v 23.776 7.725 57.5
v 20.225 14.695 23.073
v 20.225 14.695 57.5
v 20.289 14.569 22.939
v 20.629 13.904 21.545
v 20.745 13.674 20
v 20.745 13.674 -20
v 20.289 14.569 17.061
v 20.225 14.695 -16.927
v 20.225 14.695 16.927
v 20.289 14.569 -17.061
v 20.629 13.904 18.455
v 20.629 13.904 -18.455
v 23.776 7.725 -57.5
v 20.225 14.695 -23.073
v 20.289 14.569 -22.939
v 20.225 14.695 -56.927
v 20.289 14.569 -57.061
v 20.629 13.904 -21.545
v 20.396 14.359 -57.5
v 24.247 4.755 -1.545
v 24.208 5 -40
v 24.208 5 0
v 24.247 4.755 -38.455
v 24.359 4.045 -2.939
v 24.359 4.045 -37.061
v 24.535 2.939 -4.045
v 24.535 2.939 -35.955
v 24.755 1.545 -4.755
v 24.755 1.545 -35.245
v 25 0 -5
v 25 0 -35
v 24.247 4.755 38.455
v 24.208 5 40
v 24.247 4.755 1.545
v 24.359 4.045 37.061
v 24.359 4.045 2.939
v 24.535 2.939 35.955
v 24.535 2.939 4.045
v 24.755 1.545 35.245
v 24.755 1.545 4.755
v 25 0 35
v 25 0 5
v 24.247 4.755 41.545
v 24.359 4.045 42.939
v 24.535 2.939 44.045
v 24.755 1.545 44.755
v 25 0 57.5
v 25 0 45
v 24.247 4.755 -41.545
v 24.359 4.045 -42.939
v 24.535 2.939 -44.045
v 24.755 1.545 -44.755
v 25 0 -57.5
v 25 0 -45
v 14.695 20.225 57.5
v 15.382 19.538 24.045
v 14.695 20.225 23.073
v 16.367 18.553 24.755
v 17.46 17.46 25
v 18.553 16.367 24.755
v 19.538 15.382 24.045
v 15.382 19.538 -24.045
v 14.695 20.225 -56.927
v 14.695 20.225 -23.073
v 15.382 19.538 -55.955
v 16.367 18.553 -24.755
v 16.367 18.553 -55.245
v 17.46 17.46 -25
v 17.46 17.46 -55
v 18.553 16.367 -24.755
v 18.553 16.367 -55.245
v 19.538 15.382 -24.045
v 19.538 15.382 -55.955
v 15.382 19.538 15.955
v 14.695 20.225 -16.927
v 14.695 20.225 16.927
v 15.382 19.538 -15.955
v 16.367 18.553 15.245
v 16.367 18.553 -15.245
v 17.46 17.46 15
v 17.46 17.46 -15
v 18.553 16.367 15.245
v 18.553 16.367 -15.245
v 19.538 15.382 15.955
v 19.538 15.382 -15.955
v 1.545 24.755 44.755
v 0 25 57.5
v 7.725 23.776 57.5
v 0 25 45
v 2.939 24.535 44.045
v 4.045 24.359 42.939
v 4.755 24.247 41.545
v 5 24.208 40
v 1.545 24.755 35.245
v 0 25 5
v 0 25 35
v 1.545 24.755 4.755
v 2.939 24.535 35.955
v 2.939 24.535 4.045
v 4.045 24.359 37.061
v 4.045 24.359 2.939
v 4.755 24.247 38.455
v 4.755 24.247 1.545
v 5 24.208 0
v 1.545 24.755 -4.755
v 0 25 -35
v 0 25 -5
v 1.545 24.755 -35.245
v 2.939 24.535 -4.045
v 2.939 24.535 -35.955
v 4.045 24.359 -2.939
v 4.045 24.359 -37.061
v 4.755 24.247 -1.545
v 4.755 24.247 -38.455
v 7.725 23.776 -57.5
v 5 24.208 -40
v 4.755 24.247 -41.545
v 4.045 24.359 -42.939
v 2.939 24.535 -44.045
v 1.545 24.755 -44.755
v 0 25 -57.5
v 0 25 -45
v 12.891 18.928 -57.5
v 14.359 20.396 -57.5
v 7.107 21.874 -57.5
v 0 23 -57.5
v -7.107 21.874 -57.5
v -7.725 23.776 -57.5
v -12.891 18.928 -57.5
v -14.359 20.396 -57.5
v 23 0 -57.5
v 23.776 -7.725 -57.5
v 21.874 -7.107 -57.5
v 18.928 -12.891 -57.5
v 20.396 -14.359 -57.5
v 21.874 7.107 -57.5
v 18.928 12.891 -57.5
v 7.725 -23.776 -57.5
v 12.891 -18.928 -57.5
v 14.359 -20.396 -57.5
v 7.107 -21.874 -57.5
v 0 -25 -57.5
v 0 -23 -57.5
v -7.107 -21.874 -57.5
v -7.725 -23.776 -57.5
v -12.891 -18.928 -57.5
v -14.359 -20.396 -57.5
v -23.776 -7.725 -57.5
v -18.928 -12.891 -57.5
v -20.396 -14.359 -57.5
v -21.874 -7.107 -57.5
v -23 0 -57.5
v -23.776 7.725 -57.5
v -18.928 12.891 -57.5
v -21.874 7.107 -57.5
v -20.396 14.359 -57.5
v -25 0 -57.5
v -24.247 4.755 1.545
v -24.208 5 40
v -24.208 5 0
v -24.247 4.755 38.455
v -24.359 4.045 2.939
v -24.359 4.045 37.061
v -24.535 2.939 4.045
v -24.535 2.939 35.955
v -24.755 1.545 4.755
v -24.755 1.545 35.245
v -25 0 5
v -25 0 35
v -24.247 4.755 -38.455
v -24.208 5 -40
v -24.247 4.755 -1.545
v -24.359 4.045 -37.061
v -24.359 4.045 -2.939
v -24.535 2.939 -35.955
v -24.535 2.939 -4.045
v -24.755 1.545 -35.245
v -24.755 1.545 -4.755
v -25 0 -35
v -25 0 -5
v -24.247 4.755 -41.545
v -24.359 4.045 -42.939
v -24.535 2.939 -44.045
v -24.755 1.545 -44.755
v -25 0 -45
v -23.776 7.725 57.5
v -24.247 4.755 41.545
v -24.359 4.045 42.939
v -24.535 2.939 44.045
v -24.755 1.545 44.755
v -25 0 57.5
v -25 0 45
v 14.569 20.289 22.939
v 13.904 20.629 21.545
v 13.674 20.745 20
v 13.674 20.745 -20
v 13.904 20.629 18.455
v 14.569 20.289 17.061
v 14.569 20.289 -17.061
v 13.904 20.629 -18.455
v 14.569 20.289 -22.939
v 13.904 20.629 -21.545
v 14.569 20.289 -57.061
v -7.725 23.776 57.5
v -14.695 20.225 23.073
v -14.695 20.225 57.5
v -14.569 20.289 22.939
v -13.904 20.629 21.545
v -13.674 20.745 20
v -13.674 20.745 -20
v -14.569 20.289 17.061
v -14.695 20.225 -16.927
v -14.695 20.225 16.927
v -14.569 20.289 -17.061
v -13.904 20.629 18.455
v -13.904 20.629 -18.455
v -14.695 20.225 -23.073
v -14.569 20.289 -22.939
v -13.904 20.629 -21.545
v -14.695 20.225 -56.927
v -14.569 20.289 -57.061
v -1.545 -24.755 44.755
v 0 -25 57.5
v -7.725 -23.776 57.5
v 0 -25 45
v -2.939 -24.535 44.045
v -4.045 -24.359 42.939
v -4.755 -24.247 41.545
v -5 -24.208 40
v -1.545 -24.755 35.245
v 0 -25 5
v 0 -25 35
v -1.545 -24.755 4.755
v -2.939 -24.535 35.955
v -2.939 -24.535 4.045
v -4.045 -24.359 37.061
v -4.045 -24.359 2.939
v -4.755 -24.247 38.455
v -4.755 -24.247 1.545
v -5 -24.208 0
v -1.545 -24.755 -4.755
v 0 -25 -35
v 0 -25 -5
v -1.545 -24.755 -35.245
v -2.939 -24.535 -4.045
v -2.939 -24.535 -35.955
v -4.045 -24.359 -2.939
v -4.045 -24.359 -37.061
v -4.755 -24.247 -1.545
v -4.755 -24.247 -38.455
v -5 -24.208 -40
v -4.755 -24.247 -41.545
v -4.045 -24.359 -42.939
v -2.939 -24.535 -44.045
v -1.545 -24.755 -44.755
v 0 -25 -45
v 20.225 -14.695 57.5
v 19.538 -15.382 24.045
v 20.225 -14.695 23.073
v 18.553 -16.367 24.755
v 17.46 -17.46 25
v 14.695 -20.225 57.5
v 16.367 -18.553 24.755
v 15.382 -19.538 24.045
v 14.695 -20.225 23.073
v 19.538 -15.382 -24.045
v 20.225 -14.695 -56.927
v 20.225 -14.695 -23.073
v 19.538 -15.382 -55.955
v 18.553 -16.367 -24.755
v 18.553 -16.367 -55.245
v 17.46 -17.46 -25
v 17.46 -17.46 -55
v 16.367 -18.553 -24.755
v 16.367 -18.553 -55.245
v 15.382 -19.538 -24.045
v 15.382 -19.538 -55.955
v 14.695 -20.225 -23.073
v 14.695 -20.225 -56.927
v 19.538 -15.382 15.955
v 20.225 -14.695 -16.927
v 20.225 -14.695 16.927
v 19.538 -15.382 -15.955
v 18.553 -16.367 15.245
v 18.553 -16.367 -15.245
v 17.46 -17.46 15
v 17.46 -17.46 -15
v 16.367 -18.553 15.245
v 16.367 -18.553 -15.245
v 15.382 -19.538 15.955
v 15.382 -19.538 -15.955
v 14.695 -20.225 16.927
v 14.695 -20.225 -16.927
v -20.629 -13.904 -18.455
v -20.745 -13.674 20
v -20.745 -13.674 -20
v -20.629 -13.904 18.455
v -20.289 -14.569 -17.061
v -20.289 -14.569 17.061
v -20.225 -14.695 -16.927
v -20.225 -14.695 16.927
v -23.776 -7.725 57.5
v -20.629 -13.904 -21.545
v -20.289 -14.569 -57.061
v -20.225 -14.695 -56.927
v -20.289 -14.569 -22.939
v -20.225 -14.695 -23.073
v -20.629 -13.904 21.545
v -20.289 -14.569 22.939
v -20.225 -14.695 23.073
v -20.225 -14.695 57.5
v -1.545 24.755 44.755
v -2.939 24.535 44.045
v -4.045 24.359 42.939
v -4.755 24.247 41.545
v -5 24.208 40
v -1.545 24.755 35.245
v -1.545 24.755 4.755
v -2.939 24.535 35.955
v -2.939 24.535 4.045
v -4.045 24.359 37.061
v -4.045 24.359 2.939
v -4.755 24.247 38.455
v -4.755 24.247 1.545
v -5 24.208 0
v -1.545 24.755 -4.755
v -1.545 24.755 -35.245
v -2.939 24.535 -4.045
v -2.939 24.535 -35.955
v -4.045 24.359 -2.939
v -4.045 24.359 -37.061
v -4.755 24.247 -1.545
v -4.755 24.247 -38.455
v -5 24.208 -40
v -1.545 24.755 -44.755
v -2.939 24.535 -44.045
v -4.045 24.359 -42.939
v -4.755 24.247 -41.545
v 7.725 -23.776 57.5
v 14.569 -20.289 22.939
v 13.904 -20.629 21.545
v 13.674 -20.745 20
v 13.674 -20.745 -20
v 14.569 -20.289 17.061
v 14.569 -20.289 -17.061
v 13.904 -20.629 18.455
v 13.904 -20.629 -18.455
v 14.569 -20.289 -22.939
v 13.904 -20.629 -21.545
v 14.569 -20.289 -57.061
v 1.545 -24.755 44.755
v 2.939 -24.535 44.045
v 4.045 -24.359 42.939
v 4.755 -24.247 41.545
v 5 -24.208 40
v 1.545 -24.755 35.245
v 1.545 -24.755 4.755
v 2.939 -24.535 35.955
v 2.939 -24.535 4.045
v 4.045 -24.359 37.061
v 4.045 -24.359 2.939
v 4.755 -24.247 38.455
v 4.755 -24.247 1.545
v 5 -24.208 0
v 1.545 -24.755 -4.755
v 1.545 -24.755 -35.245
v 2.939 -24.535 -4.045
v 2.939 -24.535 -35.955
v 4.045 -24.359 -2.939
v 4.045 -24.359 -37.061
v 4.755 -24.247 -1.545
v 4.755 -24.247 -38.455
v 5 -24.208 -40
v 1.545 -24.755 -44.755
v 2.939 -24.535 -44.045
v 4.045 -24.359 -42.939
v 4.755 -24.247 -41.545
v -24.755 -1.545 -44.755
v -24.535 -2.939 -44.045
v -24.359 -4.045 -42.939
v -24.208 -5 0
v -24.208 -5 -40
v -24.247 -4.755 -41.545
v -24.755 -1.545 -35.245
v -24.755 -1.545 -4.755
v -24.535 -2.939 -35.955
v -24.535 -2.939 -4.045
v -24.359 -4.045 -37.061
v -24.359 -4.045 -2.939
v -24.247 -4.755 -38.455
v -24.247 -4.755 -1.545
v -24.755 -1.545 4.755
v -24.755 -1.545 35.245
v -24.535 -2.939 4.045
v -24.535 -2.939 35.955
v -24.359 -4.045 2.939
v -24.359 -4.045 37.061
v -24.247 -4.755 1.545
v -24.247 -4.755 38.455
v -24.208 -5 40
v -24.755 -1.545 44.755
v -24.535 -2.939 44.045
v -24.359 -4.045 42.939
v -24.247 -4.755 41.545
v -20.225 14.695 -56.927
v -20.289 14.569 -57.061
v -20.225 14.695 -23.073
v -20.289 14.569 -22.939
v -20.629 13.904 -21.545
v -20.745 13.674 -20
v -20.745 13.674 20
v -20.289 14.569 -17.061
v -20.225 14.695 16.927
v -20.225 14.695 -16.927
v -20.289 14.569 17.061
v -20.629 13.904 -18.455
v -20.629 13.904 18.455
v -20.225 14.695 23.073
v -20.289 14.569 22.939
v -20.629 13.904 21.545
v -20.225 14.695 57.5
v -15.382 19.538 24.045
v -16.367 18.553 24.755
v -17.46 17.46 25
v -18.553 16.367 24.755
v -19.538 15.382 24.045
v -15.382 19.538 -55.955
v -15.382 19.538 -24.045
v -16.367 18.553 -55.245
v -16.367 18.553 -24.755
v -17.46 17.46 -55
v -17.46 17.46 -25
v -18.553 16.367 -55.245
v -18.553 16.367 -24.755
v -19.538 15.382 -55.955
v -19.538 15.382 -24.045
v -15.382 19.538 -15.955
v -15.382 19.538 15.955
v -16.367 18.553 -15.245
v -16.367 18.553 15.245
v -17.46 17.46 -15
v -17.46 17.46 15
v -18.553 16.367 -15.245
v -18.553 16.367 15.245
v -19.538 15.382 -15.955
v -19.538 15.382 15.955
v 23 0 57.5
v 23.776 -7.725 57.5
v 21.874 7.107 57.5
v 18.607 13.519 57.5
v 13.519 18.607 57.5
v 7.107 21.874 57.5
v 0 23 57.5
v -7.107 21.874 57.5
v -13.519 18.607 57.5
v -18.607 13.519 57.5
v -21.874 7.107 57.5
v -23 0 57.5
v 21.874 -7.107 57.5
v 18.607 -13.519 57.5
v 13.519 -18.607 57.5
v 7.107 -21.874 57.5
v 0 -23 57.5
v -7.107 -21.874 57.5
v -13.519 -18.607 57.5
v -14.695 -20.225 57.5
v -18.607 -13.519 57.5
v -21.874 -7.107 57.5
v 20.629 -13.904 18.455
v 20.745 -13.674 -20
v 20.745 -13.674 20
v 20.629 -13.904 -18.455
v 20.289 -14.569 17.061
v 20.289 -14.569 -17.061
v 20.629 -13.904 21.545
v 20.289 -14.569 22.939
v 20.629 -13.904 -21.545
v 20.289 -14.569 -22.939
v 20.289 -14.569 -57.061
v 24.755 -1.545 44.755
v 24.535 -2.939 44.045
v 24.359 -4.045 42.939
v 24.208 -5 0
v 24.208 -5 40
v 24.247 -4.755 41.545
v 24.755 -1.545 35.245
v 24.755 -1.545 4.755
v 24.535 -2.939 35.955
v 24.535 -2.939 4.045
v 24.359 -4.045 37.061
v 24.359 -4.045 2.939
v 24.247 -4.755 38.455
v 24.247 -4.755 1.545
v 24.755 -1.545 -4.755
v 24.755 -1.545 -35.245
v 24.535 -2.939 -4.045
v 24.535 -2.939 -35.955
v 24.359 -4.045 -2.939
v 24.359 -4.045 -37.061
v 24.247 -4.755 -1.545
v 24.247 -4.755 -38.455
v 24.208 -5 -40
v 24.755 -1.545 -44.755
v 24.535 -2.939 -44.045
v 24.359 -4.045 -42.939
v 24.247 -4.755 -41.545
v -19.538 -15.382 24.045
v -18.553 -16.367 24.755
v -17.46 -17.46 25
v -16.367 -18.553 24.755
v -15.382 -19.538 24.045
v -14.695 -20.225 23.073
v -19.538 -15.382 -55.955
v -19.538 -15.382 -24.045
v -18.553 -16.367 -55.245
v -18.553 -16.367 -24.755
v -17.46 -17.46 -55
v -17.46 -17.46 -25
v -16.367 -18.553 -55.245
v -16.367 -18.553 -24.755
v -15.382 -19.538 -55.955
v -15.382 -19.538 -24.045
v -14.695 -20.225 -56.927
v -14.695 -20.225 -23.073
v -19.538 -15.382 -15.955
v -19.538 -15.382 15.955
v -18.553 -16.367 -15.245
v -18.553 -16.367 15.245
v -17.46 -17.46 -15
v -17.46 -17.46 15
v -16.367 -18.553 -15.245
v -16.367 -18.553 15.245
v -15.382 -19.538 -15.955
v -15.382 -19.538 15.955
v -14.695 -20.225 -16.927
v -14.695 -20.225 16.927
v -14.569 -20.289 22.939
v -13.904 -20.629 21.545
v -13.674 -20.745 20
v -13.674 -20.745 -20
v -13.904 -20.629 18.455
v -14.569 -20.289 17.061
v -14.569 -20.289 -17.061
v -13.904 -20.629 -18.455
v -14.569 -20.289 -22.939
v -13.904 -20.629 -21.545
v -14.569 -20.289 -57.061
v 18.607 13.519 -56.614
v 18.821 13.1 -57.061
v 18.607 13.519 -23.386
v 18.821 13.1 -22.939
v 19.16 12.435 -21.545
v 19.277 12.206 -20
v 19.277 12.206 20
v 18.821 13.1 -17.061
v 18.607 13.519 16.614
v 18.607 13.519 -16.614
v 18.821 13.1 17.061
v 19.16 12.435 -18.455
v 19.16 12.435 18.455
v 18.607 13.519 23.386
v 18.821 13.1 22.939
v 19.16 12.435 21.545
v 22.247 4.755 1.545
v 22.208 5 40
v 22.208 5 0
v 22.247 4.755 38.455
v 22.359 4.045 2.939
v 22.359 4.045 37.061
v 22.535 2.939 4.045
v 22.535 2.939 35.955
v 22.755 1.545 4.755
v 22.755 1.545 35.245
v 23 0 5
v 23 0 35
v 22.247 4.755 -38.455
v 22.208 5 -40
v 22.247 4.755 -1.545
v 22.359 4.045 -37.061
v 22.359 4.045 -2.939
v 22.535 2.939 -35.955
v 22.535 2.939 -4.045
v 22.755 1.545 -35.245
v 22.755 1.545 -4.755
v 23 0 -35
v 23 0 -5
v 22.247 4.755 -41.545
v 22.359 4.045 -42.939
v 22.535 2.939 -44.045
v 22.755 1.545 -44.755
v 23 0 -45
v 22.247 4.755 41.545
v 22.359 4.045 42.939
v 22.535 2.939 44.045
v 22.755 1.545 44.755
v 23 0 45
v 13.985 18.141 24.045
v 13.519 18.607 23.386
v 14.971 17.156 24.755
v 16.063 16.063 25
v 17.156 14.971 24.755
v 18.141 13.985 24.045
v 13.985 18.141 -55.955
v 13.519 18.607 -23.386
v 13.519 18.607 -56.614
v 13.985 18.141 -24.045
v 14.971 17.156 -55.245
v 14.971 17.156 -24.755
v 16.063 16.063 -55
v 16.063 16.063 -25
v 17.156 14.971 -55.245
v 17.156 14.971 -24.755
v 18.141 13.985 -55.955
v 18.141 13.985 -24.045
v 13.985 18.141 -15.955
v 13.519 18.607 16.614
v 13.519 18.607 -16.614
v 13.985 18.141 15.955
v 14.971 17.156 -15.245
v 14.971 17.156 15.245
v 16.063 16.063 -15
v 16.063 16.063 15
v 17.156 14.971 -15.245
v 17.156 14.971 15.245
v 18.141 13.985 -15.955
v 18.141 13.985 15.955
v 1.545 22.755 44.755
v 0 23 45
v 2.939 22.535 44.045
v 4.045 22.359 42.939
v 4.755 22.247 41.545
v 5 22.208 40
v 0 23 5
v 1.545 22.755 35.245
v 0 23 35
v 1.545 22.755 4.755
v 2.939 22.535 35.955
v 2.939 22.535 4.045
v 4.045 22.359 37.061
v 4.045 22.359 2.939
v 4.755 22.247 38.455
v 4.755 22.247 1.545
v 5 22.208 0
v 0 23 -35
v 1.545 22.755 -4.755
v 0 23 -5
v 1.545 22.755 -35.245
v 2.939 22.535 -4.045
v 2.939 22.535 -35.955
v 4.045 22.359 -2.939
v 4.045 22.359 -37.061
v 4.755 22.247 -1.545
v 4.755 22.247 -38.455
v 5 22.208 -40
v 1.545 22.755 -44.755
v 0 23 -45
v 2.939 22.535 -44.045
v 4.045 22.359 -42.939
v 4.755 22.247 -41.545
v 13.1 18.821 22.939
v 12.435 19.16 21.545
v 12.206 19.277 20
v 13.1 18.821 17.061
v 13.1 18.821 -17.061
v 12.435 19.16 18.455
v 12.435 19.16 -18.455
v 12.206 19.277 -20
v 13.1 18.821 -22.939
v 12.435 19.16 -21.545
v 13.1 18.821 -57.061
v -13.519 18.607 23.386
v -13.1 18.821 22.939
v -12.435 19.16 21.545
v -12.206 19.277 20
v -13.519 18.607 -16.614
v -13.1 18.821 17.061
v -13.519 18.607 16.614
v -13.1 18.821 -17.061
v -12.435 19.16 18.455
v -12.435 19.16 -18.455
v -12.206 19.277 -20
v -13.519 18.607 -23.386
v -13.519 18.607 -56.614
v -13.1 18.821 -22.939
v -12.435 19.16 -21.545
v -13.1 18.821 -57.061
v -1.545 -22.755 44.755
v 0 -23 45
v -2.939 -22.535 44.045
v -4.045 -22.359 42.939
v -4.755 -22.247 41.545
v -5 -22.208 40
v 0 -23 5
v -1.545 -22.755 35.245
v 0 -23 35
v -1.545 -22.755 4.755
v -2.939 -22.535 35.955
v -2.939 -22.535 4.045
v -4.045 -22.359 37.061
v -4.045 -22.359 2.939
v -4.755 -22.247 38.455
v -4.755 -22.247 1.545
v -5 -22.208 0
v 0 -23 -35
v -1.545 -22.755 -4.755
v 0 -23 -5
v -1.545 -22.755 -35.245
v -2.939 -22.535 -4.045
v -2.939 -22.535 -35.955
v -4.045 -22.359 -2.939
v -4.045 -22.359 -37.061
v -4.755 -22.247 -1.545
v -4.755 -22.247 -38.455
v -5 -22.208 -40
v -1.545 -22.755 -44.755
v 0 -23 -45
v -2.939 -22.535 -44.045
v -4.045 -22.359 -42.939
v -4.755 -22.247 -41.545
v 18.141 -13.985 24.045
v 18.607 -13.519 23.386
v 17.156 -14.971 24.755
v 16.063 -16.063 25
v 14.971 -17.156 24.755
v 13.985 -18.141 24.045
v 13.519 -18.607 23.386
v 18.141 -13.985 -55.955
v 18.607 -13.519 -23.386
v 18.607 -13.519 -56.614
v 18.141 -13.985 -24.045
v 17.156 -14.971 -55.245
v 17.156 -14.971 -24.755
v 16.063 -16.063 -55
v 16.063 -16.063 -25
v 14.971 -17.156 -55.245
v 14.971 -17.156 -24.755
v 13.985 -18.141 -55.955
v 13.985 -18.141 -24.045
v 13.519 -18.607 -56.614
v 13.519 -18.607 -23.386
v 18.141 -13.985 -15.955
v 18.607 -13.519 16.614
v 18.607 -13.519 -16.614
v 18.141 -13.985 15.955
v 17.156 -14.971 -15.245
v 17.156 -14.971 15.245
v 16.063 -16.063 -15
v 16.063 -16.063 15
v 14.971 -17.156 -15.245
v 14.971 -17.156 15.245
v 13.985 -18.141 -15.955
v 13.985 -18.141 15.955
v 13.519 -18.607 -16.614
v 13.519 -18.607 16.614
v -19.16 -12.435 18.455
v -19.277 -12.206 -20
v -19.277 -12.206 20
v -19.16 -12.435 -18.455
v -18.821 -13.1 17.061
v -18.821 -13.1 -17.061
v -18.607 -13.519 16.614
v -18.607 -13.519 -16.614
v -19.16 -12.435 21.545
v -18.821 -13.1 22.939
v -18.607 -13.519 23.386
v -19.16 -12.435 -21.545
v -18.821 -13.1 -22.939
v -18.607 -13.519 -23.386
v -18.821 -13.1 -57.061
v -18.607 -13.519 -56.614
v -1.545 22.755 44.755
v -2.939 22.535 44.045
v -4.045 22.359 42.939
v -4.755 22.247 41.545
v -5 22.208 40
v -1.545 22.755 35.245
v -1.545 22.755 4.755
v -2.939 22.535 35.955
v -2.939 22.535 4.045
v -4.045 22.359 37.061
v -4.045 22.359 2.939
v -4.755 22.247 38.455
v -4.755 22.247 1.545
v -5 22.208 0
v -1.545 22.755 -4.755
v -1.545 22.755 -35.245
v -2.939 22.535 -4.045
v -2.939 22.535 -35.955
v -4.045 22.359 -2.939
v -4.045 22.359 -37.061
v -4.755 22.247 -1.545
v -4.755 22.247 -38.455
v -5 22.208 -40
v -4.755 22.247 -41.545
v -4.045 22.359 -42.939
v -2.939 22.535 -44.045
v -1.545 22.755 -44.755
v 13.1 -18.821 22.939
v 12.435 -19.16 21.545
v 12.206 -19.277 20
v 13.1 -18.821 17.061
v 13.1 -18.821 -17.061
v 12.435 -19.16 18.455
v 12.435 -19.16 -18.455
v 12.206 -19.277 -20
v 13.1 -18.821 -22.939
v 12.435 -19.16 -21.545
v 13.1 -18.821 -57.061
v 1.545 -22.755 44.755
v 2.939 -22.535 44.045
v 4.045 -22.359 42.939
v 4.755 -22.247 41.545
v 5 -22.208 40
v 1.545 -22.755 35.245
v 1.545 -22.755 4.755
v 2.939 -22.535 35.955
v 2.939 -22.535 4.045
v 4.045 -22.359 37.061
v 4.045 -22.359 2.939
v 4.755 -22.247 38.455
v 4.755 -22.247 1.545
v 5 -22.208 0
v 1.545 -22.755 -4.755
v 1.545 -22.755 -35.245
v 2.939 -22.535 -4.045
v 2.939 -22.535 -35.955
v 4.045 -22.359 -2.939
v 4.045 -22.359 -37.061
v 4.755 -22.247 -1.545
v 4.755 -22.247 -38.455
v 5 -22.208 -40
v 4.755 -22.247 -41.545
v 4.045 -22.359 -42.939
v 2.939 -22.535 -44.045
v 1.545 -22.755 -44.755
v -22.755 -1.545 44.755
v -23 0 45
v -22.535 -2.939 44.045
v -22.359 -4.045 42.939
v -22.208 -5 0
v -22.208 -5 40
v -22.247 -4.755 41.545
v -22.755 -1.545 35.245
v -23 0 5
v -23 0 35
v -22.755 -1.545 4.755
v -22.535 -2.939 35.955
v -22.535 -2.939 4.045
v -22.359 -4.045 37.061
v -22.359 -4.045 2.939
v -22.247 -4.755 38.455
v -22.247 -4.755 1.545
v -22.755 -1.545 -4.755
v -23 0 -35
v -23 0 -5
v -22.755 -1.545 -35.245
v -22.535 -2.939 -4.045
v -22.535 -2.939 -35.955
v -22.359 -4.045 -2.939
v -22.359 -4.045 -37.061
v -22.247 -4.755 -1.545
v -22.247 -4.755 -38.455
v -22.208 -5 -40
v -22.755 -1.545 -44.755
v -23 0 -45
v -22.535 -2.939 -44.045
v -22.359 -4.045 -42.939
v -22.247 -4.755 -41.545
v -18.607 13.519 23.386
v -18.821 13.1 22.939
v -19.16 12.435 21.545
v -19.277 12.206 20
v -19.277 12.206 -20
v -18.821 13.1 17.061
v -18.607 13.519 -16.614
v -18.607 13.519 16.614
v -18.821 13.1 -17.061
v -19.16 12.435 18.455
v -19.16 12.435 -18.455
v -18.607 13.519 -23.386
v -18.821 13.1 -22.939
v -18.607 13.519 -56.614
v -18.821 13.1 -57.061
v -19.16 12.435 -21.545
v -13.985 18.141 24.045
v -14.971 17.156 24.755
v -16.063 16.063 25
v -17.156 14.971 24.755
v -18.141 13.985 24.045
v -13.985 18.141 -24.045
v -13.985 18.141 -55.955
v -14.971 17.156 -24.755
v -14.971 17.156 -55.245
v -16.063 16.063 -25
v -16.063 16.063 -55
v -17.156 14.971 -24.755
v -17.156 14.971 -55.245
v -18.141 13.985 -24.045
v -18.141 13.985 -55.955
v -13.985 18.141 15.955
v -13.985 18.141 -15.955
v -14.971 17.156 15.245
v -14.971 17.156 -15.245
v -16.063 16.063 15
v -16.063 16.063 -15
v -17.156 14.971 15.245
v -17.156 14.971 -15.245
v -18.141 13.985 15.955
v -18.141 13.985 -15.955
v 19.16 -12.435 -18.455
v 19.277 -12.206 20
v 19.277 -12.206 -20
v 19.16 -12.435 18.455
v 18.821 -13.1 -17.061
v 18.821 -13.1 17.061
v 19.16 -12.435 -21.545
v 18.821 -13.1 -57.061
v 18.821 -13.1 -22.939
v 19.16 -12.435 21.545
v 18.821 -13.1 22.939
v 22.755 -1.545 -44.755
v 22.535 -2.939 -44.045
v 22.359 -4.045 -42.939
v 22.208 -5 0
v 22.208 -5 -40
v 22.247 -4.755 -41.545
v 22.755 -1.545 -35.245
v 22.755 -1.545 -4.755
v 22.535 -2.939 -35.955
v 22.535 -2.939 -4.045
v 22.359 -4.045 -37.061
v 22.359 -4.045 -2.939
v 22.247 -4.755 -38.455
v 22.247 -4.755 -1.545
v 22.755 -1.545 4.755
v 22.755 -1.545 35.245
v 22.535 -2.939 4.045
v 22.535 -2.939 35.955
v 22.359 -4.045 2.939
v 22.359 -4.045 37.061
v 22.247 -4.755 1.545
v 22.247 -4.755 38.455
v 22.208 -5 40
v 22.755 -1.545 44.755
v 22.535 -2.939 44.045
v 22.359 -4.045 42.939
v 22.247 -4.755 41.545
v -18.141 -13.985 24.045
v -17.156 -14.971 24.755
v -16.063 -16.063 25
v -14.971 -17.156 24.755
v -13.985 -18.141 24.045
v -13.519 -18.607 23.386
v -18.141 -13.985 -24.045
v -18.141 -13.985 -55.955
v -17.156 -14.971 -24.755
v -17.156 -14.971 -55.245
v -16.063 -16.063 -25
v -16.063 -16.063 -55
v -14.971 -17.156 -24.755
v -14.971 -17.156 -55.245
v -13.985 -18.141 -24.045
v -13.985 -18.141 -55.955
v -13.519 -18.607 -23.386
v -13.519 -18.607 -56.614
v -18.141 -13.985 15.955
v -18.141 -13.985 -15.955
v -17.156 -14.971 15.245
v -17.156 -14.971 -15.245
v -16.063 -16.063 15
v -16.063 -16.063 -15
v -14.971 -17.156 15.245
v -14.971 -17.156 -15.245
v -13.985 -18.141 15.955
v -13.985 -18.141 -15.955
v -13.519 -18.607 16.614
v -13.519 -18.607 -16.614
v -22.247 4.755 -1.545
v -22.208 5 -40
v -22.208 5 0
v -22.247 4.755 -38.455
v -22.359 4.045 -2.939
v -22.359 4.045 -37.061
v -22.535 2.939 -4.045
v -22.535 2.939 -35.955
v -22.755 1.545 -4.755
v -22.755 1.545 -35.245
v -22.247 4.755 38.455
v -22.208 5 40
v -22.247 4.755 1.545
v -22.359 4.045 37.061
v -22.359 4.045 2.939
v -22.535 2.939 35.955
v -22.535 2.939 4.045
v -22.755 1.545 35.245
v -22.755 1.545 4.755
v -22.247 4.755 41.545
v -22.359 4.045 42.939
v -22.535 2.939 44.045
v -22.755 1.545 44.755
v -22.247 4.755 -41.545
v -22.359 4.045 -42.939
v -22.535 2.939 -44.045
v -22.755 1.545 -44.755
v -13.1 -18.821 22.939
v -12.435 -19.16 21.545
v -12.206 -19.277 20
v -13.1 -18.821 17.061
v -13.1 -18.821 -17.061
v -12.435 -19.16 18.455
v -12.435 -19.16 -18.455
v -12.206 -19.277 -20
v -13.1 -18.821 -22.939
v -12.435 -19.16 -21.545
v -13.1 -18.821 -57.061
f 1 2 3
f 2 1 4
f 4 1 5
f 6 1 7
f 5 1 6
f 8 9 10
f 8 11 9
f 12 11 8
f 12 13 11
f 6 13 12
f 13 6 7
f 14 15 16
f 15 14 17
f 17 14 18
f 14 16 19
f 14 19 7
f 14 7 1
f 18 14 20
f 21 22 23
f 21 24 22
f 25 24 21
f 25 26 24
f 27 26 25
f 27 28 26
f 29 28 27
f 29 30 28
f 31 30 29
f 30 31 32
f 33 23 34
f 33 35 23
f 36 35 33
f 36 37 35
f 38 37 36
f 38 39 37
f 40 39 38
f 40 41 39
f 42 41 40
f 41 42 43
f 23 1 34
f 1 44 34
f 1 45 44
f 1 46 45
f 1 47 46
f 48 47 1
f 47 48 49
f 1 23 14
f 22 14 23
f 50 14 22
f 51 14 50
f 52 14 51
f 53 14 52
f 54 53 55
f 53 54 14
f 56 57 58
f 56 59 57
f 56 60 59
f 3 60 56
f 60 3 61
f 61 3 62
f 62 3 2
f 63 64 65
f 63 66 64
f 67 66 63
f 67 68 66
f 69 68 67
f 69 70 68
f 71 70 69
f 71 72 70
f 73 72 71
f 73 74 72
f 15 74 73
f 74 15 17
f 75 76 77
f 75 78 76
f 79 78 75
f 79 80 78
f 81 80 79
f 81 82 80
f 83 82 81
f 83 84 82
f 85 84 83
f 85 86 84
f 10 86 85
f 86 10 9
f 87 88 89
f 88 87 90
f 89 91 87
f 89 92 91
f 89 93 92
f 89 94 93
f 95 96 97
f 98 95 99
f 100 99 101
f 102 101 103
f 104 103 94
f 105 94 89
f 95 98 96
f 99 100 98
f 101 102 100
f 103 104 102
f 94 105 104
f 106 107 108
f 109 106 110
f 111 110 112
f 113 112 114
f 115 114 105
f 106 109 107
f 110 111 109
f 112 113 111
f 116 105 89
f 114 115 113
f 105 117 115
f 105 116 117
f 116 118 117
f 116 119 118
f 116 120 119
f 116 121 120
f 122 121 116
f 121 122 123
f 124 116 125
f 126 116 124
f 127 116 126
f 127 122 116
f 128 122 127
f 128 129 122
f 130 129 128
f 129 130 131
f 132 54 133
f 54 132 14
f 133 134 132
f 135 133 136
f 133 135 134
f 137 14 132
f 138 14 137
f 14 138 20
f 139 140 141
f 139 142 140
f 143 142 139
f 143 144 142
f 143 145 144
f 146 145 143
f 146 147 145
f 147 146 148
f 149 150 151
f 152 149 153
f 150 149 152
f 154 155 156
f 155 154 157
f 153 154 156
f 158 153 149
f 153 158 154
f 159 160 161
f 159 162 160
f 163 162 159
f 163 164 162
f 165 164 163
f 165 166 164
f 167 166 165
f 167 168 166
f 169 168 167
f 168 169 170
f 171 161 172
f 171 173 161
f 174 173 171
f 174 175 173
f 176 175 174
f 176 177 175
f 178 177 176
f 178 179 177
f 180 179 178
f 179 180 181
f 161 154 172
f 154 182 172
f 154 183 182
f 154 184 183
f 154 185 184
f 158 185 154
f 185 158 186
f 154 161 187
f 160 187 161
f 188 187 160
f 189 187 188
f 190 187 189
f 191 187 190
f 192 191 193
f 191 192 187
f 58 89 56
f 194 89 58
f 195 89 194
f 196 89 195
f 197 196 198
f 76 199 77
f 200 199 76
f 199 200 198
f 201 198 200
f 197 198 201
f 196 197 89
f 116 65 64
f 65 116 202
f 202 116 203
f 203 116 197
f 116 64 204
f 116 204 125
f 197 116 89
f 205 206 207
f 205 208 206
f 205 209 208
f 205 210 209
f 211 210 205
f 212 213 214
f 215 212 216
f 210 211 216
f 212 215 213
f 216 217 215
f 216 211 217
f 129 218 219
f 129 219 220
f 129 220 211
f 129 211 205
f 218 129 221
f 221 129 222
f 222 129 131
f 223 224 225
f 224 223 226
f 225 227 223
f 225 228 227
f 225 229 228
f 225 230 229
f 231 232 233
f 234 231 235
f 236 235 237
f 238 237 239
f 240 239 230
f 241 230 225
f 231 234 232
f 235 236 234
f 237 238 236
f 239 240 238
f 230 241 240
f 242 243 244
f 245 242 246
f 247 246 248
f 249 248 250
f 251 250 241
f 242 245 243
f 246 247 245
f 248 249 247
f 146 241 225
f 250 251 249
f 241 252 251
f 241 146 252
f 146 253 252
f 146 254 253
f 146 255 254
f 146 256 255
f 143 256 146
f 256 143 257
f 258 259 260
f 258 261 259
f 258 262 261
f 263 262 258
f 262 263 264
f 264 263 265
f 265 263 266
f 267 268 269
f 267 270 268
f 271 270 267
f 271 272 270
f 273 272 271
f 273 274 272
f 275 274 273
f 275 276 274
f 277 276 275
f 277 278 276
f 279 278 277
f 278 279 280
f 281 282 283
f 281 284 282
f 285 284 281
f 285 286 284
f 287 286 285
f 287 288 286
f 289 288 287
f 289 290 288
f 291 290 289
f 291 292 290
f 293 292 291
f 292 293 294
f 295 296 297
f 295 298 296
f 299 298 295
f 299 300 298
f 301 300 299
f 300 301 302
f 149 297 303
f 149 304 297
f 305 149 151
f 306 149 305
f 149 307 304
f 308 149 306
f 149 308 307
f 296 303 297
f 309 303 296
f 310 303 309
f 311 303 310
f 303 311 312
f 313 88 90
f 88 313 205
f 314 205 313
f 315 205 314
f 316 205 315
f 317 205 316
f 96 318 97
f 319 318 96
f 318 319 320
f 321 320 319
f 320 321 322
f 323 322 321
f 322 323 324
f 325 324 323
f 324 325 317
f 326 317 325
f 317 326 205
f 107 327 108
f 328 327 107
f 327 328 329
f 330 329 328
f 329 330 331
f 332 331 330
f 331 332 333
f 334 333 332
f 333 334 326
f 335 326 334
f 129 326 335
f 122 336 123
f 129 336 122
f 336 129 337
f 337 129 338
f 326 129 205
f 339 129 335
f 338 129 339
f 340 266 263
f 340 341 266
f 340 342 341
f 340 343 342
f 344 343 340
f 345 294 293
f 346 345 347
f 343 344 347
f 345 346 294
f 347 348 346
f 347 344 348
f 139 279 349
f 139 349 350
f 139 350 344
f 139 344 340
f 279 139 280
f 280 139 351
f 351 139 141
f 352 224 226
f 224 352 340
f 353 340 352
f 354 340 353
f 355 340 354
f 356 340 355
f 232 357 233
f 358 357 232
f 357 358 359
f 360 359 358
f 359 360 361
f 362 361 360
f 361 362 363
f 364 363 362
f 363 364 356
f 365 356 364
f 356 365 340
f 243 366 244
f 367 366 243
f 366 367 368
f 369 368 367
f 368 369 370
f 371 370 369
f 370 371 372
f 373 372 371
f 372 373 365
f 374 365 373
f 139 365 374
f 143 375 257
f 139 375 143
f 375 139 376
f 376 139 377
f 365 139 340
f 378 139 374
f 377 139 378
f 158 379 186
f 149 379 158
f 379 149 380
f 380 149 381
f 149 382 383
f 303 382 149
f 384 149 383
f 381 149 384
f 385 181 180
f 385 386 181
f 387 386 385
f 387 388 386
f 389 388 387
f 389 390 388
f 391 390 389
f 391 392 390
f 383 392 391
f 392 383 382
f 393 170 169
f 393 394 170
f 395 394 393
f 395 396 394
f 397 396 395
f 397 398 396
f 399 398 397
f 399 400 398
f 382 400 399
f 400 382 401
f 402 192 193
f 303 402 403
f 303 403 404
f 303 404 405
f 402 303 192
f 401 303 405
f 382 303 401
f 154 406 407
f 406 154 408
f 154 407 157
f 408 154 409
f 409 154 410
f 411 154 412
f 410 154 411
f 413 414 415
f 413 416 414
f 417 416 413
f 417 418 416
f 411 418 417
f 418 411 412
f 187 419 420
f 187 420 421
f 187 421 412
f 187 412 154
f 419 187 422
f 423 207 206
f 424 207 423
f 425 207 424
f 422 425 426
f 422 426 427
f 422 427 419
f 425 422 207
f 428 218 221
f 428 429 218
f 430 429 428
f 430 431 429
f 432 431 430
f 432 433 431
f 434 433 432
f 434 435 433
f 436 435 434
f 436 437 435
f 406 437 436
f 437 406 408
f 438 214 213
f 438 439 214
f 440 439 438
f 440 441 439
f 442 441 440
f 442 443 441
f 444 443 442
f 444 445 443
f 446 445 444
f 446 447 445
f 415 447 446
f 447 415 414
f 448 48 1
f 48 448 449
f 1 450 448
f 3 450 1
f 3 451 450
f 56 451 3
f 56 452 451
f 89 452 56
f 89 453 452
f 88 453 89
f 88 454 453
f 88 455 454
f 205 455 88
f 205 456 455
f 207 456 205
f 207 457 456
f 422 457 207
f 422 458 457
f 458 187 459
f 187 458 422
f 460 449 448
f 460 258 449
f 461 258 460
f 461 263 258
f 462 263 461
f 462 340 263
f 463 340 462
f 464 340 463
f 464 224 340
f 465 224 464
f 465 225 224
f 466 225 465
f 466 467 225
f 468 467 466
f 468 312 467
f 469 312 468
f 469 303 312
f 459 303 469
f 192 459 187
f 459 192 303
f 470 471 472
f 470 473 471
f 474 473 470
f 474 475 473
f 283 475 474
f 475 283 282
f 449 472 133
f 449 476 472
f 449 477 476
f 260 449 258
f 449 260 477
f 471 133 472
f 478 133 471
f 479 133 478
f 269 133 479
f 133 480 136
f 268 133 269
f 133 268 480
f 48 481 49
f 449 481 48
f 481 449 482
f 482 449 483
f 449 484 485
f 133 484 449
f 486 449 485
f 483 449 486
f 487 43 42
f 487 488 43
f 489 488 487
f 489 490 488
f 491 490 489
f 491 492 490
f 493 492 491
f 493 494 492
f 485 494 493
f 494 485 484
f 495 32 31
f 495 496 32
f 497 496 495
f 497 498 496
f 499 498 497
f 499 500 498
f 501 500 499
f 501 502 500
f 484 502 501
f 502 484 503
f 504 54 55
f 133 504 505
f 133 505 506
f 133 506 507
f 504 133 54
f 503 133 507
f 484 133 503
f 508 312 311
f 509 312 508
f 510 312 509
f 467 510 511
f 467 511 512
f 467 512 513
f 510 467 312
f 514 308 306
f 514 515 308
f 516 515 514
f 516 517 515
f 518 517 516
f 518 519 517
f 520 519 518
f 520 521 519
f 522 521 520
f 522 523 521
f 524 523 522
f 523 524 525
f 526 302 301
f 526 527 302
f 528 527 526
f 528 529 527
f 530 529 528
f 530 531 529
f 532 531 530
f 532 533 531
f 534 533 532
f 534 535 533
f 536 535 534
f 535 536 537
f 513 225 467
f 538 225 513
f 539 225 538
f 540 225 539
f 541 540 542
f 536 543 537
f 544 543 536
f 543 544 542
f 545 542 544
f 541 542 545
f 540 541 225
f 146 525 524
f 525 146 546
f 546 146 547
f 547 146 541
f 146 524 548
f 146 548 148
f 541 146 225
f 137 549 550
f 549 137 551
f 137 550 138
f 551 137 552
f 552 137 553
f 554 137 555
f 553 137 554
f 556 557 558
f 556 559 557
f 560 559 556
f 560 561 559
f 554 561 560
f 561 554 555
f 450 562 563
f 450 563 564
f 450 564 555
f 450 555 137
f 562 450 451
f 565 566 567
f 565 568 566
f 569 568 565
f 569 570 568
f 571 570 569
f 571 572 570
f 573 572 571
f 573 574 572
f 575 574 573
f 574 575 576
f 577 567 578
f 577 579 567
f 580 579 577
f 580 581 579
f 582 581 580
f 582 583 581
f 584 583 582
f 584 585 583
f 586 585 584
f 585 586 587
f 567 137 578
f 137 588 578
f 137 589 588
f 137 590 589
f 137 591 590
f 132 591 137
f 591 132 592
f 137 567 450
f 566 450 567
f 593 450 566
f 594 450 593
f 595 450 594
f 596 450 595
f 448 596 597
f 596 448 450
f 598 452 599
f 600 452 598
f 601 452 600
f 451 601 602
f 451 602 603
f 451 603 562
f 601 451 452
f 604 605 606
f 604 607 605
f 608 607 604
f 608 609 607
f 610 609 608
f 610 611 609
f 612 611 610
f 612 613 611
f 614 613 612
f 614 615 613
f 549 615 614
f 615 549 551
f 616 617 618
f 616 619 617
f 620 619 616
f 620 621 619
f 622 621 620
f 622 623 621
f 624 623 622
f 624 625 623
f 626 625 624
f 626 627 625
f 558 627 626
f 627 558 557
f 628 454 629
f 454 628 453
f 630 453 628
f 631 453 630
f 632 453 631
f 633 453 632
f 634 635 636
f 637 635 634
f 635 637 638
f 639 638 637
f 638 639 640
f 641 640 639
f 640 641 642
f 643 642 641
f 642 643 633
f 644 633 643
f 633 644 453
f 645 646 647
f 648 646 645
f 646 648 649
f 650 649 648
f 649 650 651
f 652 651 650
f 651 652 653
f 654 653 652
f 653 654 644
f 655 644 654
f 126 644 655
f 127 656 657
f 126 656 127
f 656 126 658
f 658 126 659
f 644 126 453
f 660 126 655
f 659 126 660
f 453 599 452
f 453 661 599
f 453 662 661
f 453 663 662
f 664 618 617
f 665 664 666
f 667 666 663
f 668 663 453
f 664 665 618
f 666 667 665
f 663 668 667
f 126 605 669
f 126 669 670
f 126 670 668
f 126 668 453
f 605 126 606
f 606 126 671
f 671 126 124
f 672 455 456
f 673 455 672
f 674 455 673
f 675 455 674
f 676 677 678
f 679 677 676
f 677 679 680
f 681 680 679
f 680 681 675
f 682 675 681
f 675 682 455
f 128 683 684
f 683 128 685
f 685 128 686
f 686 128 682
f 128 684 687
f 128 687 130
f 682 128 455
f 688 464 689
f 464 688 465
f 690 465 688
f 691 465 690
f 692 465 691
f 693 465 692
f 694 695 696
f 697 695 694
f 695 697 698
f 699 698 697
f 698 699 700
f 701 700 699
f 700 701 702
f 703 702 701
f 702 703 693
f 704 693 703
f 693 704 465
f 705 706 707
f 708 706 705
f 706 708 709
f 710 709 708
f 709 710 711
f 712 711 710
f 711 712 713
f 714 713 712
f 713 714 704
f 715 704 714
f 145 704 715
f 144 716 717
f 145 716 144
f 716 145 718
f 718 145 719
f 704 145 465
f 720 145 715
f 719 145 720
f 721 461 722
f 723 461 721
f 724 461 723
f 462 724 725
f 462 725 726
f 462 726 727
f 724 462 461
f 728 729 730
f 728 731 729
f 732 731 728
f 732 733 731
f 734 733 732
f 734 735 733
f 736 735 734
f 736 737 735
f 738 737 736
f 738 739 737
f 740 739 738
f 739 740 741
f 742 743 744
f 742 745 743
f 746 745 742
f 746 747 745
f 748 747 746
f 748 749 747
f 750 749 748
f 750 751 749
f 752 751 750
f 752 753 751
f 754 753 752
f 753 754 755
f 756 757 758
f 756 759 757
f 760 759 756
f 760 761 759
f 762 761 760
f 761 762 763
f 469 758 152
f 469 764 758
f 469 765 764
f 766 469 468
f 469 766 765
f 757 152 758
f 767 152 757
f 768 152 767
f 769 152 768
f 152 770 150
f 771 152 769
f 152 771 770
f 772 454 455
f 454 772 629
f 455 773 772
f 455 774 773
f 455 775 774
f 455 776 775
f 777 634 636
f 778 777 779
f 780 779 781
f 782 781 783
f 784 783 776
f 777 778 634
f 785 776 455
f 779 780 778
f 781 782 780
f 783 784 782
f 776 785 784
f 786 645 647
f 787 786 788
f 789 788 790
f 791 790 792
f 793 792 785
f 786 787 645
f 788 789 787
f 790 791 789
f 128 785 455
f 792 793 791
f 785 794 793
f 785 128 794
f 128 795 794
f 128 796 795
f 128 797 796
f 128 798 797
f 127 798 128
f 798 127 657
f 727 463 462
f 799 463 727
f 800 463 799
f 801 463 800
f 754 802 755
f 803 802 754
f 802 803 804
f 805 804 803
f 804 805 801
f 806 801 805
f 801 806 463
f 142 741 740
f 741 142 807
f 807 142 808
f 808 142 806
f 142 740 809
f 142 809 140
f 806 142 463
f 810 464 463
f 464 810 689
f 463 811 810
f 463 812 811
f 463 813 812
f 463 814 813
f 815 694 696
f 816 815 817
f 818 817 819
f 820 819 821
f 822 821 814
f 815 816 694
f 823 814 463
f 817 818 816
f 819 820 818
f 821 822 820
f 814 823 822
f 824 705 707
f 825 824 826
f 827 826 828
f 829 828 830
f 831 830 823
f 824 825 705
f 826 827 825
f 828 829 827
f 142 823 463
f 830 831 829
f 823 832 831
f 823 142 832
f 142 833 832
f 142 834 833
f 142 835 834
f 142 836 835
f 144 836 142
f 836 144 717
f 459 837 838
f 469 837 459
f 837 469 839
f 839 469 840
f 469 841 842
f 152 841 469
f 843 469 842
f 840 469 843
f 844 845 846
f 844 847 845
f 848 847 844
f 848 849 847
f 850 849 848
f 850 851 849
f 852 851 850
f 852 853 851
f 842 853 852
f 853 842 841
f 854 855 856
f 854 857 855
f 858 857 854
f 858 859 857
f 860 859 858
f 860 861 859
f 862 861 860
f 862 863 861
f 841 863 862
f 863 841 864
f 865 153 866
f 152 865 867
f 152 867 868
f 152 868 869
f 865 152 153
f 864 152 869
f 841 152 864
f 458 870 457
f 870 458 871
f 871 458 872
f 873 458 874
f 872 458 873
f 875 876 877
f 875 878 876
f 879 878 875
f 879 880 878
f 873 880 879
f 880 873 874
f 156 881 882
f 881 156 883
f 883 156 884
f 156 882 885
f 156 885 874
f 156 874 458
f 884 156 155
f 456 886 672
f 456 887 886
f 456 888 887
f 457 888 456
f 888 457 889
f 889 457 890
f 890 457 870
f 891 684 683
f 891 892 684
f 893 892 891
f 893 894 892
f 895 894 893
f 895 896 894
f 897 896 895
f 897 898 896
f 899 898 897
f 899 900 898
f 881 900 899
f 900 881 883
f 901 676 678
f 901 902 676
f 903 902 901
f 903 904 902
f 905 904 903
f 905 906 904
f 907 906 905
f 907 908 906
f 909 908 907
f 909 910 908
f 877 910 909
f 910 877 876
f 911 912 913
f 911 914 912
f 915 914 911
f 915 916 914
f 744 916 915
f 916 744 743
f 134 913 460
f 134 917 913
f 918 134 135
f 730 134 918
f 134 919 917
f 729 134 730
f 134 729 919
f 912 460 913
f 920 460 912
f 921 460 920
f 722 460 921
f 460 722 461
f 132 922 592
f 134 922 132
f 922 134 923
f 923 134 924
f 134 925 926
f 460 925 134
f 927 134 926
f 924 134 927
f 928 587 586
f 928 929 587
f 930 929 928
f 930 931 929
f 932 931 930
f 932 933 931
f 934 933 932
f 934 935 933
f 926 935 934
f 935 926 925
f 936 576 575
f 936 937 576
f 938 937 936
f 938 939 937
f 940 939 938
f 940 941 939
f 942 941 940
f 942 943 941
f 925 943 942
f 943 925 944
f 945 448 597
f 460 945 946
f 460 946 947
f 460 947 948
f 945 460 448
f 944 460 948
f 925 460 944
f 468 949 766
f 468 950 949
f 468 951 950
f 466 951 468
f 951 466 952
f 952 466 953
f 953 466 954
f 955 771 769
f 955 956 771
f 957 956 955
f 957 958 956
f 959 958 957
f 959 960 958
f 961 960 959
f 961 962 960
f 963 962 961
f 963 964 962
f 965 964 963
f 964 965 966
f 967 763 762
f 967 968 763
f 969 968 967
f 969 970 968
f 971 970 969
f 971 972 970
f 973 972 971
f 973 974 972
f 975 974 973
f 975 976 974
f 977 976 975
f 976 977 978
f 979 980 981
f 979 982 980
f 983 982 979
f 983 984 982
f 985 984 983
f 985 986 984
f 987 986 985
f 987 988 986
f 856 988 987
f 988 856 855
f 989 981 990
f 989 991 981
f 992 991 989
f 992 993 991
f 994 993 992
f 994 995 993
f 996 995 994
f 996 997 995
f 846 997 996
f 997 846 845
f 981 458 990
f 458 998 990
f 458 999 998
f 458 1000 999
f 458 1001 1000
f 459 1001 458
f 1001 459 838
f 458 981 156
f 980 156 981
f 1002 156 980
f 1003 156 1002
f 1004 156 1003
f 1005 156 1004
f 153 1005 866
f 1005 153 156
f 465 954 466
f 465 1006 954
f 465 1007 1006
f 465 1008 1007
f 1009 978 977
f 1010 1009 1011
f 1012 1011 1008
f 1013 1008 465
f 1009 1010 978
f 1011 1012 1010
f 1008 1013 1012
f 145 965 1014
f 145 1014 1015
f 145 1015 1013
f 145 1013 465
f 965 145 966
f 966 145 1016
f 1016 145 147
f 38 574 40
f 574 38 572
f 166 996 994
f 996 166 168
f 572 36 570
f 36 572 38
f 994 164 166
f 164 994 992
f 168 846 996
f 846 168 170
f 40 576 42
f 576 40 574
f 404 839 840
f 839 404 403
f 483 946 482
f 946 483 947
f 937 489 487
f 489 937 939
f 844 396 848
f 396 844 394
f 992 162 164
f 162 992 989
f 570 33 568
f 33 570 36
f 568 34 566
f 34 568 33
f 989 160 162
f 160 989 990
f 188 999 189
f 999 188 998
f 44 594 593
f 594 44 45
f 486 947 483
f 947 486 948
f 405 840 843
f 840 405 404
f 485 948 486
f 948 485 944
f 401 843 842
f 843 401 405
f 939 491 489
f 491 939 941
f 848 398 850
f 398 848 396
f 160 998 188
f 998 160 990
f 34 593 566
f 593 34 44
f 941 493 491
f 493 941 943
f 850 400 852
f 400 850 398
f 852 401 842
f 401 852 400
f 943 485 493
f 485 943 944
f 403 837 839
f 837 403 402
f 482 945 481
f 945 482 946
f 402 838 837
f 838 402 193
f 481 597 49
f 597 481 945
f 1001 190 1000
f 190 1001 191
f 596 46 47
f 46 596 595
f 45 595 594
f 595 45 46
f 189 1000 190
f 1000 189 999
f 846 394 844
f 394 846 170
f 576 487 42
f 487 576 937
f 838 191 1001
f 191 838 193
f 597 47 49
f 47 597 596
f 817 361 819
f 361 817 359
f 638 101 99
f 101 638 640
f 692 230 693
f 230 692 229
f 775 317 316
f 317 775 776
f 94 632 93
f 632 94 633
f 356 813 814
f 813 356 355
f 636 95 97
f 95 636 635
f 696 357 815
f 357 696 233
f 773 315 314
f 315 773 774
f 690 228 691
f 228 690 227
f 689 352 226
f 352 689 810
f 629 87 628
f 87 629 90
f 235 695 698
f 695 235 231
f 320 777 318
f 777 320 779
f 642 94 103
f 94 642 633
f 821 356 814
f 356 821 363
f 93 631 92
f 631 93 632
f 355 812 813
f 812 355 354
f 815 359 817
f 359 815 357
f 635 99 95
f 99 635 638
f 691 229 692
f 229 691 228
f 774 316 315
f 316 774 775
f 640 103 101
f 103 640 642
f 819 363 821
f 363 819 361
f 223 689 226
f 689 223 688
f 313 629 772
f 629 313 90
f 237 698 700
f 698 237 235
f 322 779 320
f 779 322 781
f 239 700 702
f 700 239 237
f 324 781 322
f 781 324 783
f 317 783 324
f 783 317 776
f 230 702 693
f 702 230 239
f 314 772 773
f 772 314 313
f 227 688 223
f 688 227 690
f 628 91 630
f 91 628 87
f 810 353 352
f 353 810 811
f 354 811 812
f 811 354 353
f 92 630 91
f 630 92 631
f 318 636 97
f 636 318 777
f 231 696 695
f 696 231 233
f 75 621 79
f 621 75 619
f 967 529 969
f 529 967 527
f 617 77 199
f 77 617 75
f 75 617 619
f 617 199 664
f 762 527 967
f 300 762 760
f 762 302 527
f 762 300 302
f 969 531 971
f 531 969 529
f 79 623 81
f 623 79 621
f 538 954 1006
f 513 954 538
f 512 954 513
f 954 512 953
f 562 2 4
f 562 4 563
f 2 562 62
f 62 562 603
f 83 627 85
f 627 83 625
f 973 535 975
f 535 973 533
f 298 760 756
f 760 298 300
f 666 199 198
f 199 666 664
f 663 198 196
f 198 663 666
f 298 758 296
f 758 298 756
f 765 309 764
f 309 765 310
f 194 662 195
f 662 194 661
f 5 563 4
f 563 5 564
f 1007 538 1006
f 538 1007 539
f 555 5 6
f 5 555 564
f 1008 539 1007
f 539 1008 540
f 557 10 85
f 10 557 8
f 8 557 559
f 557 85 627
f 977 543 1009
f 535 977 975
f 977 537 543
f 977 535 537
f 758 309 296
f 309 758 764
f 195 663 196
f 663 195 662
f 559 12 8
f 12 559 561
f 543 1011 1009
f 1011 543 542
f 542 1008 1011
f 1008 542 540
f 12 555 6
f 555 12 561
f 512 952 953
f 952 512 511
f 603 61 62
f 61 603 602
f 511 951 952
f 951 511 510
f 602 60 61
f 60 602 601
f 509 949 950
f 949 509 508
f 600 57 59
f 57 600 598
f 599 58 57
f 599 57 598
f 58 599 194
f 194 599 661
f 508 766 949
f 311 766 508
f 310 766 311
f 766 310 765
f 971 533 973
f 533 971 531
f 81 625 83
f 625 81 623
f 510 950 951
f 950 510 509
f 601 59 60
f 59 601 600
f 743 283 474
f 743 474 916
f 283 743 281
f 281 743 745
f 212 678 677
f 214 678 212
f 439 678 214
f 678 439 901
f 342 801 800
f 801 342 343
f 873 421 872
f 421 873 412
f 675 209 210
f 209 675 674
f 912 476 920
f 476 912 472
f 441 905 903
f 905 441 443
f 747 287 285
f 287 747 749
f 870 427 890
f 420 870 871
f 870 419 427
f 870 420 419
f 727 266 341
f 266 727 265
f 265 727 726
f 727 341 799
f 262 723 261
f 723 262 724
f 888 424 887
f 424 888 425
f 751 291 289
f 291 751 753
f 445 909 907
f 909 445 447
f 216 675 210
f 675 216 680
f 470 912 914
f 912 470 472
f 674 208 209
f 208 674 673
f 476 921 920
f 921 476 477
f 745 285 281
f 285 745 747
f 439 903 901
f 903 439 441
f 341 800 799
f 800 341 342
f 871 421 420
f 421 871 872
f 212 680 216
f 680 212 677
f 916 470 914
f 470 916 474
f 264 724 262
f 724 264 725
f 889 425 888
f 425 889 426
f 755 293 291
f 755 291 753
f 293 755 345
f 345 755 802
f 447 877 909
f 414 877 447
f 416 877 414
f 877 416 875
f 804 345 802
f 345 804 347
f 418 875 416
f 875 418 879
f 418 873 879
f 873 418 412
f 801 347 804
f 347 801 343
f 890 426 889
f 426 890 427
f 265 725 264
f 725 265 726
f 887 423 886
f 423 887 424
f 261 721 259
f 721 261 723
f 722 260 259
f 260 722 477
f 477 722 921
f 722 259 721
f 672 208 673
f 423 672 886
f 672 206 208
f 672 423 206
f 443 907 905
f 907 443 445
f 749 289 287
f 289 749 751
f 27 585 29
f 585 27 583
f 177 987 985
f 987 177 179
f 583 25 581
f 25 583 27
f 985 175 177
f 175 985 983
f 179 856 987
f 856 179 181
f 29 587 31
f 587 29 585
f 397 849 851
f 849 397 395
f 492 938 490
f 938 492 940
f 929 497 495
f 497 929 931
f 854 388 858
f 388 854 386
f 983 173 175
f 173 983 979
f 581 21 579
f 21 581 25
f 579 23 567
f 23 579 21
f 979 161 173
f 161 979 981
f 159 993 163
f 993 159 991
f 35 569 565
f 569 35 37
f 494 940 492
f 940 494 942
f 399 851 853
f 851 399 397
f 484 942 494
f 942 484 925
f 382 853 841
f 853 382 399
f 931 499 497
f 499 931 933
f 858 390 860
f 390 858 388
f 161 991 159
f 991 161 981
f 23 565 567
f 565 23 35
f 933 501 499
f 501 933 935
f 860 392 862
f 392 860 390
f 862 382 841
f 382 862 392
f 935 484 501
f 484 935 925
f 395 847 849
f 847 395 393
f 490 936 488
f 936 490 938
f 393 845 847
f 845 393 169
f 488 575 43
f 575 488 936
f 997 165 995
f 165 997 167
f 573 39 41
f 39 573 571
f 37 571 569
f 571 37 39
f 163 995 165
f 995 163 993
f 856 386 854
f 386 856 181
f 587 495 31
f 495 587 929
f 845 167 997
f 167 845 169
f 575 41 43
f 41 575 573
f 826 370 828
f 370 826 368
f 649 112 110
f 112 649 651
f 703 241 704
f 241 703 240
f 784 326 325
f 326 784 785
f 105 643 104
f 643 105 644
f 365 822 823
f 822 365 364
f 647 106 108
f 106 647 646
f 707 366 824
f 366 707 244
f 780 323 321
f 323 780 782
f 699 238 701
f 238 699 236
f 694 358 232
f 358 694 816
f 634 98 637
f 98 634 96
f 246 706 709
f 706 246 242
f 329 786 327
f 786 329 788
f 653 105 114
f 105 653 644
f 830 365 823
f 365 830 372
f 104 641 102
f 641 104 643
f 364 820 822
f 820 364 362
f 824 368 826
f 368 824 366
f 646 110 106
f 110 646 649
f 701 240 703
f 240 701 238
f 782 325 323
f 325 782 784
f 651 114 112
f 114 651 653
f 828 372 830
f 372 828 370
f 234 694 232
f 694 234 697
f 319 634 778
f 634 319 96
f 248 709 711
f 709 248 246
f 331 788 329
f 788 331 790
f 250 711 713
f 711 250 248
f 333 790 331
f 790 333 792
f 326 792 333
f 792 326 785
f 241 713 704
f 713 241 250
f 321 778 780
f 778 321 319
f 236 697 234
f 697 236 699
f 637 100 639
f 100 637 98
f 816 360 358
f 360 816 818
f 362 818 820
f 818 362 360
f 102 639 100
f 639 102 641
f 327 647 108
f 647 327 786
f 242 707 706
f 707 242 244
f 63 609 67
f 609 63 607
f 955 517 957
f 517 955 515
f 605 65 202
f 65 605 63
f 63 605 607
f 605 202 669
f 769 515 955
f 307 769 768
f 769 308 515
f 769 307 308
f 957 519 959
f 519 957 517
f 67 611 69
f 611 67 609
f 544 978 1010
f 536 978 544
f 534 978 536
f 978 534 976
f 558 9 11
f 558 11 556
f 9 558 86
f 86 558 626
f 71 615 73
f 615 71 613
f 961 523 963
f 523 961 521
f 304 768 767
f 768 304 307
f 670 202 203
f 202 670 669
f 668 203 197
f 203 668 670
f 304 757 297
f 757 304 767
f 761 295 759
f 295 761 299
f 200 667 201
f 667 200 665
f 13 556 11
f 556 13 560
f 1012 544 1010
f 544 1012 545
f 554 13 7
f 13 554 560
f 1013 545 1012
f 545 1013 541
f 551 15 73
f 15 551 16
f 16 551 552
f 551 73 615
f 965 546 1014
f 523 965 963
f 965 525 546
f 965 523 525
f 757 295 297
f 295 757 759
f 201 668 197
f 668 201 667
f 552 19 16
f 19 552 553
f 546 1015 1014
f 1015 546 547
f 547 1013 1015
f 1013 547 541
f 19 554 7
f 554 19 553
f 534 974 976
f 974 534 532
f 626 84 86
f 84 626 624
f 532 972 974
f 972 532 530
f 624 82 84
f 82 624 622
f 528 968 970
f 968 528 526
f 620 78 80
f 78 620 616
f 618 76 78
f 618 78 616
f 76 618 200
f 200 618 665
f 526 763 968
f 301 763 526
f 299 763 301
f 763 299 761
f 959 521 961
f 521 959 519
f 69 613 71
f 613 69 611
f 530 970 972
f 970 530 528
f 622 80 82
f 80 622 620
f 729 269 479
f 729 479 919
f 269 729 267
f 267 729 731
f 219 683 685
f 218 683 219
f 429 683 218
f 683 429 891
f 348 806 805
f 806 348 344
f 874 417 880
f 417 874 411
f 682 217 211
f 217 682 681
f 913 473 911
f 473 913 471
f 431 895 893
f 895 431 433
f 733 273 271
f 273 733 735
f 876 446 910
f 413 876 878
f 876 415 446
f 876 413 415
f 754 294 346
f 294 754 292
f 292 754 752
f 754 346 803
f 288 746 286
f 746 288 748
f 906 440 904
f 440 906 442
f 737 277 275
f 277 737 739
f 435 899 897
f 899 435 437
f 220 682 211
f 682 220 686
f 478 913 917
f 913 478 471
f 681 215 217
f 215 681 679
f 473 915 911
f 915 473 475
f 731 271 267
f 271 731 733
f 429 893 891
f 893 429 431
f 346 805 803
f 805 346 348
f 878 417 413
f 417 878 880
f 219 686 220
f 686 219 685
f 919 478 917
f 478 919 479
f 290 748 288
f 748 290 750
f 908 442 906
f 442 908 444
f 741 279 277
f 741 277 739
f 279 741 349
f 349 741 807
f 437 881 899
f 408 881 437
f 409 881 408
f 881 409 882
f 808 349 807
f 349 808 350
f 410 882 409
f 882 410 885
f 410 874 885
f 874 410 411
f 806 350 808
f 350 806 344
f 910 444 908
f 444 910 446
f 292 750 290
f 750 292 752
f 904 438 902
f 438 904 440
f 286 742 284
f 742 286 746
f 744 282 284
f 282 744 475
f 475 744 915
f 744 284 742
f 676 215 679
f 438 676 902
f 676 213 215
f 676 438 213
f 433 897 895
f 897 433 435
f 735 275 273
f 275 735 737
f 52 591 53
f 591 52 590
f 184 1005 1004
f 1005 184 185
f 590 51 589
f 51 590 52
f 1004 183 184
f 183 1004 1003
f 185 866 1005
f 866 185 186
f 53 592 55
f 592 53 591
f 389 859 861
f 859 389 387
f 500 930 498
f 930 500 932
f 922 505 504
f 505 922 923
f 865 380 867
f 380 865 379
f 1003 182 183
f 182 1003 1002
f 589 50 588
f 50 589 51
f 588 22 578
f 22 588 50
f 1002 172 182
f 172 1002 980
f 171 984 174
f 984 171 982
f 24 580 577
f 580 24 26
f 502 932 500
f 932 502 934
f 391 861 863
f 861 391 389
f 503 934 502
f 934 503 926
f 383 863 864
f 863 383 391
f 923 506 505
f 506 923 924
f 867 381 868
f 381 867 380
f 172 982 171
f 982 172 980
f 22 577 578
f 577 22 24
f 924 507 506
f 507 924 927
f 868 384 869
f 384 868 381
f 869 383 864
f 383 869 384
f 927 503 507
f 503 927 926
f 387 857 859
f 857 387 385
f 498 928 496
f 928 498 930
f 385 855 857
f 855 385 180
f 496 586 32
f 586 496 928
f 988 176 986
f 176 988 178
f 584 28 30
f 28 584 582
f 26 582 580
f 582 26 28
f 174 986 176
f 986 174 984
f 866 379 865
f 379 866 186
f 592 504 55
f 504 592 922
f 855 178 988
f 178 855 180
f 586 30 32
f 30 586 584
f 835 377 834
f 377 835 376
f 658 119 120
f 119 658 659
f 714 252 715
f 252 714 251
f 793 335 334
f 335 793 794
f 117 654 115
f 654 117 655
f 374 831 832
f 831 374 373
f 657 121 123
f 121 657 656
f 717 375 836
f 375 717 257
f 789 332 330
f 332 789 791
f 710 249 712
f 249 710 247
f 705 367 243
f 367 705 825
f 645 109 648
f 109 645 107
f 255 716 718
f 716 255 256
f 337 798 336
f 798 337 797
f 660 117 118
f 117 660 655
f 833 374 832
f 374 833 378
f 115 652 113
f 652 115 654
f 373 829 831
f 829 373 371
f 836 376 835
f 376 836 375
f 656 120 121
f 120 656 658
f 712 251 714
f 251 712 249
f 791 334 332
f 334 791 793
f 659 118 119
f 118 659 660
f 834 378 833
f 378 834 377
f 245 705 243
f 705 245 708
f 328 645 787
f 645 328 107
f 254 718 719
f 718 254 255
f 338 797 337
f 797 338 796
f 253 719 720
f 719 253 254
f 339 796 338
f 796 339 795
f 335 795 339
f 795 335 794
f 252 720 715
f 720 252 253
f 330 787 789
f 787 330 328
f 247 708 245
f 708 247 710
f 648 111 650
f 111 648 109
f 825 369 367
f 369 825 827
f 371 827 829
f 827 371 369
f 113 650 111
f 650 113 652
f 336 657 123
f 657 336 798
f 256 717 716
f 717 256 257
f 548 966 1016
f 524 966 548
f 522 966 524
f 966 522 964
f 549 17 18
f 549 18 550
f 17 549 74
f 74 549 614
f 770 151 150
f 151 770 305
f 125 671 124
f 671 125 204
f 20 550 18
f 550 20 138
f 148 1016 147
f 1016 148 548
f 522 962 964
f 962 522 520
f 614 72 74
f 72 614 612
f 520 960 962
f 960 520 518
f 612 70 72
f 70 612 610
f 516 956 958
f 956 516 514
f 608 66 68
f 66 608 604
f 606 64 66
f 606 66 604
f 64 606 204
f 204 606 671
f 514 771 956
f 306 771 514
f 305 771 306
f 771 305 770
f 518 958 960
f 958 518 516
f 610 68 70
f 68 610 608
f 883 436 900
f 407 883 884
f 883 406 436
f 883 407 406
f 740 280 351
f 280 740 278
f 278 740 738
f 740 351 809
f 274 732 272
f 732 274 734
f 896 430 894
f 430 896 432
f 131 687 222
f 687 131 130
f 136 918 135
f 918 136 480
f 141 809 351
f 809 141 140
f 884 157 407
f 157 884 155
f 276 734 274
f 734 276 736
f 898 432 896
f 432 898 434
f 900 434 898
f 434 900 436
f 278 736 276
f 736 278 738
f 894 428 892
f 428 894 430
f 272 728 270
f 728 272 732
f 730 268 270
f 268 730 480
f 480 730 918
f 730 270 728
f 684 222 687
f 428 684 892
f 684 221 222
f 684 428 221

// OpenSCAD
detail = 20;

module tube(diametre, epaisseur, hauteur){
	difference(){
		cylinder(h=hauteur, r=diametre/2, $fn=detail, center=true);
		cylinder(h=hauteur+epaisseur, r=diametre/2-epaisseur, $fn=detail, center=true);
	}
}

module trous(diametre_trou, longueur){
	rotate([0,90,0]) cylinder(h=longueur, r=diametre_trou/2, $fn=detail, center=true);
	rotate([90,90,0]) cylinder(h=longueur, r=diametre_trou/2, $fn=detail, center=true);
}

module tube_troue(diametre, epaisseur, hauteur, diametre_trou){
	sequence = 4*diametre_trou;
	modulo = hauteur % sequence;
	marge = modulo/2;
	nb_trous = (hauteur-modulo)/sequence;
	hauteur_initiale = (hauteur)/2-marge;
	difference(){
		tube(diametre, epaisseur, hauteur);
		for (i = [0 : nb_trous]) 
		{
    		translate([0,0,hauteur_initiale-i*sequence]) trous(diametre_trou, diametre+epaisseur);
			translate([0,0,hauteur_initiale-(i+0.5)*sequence]) rotate([0,0,45]) trous(diametre_trou, diametre+epaisseur);
		}
		
	}
}

//tube(180,2,115);
tube_troue(50,2,115, 10);
